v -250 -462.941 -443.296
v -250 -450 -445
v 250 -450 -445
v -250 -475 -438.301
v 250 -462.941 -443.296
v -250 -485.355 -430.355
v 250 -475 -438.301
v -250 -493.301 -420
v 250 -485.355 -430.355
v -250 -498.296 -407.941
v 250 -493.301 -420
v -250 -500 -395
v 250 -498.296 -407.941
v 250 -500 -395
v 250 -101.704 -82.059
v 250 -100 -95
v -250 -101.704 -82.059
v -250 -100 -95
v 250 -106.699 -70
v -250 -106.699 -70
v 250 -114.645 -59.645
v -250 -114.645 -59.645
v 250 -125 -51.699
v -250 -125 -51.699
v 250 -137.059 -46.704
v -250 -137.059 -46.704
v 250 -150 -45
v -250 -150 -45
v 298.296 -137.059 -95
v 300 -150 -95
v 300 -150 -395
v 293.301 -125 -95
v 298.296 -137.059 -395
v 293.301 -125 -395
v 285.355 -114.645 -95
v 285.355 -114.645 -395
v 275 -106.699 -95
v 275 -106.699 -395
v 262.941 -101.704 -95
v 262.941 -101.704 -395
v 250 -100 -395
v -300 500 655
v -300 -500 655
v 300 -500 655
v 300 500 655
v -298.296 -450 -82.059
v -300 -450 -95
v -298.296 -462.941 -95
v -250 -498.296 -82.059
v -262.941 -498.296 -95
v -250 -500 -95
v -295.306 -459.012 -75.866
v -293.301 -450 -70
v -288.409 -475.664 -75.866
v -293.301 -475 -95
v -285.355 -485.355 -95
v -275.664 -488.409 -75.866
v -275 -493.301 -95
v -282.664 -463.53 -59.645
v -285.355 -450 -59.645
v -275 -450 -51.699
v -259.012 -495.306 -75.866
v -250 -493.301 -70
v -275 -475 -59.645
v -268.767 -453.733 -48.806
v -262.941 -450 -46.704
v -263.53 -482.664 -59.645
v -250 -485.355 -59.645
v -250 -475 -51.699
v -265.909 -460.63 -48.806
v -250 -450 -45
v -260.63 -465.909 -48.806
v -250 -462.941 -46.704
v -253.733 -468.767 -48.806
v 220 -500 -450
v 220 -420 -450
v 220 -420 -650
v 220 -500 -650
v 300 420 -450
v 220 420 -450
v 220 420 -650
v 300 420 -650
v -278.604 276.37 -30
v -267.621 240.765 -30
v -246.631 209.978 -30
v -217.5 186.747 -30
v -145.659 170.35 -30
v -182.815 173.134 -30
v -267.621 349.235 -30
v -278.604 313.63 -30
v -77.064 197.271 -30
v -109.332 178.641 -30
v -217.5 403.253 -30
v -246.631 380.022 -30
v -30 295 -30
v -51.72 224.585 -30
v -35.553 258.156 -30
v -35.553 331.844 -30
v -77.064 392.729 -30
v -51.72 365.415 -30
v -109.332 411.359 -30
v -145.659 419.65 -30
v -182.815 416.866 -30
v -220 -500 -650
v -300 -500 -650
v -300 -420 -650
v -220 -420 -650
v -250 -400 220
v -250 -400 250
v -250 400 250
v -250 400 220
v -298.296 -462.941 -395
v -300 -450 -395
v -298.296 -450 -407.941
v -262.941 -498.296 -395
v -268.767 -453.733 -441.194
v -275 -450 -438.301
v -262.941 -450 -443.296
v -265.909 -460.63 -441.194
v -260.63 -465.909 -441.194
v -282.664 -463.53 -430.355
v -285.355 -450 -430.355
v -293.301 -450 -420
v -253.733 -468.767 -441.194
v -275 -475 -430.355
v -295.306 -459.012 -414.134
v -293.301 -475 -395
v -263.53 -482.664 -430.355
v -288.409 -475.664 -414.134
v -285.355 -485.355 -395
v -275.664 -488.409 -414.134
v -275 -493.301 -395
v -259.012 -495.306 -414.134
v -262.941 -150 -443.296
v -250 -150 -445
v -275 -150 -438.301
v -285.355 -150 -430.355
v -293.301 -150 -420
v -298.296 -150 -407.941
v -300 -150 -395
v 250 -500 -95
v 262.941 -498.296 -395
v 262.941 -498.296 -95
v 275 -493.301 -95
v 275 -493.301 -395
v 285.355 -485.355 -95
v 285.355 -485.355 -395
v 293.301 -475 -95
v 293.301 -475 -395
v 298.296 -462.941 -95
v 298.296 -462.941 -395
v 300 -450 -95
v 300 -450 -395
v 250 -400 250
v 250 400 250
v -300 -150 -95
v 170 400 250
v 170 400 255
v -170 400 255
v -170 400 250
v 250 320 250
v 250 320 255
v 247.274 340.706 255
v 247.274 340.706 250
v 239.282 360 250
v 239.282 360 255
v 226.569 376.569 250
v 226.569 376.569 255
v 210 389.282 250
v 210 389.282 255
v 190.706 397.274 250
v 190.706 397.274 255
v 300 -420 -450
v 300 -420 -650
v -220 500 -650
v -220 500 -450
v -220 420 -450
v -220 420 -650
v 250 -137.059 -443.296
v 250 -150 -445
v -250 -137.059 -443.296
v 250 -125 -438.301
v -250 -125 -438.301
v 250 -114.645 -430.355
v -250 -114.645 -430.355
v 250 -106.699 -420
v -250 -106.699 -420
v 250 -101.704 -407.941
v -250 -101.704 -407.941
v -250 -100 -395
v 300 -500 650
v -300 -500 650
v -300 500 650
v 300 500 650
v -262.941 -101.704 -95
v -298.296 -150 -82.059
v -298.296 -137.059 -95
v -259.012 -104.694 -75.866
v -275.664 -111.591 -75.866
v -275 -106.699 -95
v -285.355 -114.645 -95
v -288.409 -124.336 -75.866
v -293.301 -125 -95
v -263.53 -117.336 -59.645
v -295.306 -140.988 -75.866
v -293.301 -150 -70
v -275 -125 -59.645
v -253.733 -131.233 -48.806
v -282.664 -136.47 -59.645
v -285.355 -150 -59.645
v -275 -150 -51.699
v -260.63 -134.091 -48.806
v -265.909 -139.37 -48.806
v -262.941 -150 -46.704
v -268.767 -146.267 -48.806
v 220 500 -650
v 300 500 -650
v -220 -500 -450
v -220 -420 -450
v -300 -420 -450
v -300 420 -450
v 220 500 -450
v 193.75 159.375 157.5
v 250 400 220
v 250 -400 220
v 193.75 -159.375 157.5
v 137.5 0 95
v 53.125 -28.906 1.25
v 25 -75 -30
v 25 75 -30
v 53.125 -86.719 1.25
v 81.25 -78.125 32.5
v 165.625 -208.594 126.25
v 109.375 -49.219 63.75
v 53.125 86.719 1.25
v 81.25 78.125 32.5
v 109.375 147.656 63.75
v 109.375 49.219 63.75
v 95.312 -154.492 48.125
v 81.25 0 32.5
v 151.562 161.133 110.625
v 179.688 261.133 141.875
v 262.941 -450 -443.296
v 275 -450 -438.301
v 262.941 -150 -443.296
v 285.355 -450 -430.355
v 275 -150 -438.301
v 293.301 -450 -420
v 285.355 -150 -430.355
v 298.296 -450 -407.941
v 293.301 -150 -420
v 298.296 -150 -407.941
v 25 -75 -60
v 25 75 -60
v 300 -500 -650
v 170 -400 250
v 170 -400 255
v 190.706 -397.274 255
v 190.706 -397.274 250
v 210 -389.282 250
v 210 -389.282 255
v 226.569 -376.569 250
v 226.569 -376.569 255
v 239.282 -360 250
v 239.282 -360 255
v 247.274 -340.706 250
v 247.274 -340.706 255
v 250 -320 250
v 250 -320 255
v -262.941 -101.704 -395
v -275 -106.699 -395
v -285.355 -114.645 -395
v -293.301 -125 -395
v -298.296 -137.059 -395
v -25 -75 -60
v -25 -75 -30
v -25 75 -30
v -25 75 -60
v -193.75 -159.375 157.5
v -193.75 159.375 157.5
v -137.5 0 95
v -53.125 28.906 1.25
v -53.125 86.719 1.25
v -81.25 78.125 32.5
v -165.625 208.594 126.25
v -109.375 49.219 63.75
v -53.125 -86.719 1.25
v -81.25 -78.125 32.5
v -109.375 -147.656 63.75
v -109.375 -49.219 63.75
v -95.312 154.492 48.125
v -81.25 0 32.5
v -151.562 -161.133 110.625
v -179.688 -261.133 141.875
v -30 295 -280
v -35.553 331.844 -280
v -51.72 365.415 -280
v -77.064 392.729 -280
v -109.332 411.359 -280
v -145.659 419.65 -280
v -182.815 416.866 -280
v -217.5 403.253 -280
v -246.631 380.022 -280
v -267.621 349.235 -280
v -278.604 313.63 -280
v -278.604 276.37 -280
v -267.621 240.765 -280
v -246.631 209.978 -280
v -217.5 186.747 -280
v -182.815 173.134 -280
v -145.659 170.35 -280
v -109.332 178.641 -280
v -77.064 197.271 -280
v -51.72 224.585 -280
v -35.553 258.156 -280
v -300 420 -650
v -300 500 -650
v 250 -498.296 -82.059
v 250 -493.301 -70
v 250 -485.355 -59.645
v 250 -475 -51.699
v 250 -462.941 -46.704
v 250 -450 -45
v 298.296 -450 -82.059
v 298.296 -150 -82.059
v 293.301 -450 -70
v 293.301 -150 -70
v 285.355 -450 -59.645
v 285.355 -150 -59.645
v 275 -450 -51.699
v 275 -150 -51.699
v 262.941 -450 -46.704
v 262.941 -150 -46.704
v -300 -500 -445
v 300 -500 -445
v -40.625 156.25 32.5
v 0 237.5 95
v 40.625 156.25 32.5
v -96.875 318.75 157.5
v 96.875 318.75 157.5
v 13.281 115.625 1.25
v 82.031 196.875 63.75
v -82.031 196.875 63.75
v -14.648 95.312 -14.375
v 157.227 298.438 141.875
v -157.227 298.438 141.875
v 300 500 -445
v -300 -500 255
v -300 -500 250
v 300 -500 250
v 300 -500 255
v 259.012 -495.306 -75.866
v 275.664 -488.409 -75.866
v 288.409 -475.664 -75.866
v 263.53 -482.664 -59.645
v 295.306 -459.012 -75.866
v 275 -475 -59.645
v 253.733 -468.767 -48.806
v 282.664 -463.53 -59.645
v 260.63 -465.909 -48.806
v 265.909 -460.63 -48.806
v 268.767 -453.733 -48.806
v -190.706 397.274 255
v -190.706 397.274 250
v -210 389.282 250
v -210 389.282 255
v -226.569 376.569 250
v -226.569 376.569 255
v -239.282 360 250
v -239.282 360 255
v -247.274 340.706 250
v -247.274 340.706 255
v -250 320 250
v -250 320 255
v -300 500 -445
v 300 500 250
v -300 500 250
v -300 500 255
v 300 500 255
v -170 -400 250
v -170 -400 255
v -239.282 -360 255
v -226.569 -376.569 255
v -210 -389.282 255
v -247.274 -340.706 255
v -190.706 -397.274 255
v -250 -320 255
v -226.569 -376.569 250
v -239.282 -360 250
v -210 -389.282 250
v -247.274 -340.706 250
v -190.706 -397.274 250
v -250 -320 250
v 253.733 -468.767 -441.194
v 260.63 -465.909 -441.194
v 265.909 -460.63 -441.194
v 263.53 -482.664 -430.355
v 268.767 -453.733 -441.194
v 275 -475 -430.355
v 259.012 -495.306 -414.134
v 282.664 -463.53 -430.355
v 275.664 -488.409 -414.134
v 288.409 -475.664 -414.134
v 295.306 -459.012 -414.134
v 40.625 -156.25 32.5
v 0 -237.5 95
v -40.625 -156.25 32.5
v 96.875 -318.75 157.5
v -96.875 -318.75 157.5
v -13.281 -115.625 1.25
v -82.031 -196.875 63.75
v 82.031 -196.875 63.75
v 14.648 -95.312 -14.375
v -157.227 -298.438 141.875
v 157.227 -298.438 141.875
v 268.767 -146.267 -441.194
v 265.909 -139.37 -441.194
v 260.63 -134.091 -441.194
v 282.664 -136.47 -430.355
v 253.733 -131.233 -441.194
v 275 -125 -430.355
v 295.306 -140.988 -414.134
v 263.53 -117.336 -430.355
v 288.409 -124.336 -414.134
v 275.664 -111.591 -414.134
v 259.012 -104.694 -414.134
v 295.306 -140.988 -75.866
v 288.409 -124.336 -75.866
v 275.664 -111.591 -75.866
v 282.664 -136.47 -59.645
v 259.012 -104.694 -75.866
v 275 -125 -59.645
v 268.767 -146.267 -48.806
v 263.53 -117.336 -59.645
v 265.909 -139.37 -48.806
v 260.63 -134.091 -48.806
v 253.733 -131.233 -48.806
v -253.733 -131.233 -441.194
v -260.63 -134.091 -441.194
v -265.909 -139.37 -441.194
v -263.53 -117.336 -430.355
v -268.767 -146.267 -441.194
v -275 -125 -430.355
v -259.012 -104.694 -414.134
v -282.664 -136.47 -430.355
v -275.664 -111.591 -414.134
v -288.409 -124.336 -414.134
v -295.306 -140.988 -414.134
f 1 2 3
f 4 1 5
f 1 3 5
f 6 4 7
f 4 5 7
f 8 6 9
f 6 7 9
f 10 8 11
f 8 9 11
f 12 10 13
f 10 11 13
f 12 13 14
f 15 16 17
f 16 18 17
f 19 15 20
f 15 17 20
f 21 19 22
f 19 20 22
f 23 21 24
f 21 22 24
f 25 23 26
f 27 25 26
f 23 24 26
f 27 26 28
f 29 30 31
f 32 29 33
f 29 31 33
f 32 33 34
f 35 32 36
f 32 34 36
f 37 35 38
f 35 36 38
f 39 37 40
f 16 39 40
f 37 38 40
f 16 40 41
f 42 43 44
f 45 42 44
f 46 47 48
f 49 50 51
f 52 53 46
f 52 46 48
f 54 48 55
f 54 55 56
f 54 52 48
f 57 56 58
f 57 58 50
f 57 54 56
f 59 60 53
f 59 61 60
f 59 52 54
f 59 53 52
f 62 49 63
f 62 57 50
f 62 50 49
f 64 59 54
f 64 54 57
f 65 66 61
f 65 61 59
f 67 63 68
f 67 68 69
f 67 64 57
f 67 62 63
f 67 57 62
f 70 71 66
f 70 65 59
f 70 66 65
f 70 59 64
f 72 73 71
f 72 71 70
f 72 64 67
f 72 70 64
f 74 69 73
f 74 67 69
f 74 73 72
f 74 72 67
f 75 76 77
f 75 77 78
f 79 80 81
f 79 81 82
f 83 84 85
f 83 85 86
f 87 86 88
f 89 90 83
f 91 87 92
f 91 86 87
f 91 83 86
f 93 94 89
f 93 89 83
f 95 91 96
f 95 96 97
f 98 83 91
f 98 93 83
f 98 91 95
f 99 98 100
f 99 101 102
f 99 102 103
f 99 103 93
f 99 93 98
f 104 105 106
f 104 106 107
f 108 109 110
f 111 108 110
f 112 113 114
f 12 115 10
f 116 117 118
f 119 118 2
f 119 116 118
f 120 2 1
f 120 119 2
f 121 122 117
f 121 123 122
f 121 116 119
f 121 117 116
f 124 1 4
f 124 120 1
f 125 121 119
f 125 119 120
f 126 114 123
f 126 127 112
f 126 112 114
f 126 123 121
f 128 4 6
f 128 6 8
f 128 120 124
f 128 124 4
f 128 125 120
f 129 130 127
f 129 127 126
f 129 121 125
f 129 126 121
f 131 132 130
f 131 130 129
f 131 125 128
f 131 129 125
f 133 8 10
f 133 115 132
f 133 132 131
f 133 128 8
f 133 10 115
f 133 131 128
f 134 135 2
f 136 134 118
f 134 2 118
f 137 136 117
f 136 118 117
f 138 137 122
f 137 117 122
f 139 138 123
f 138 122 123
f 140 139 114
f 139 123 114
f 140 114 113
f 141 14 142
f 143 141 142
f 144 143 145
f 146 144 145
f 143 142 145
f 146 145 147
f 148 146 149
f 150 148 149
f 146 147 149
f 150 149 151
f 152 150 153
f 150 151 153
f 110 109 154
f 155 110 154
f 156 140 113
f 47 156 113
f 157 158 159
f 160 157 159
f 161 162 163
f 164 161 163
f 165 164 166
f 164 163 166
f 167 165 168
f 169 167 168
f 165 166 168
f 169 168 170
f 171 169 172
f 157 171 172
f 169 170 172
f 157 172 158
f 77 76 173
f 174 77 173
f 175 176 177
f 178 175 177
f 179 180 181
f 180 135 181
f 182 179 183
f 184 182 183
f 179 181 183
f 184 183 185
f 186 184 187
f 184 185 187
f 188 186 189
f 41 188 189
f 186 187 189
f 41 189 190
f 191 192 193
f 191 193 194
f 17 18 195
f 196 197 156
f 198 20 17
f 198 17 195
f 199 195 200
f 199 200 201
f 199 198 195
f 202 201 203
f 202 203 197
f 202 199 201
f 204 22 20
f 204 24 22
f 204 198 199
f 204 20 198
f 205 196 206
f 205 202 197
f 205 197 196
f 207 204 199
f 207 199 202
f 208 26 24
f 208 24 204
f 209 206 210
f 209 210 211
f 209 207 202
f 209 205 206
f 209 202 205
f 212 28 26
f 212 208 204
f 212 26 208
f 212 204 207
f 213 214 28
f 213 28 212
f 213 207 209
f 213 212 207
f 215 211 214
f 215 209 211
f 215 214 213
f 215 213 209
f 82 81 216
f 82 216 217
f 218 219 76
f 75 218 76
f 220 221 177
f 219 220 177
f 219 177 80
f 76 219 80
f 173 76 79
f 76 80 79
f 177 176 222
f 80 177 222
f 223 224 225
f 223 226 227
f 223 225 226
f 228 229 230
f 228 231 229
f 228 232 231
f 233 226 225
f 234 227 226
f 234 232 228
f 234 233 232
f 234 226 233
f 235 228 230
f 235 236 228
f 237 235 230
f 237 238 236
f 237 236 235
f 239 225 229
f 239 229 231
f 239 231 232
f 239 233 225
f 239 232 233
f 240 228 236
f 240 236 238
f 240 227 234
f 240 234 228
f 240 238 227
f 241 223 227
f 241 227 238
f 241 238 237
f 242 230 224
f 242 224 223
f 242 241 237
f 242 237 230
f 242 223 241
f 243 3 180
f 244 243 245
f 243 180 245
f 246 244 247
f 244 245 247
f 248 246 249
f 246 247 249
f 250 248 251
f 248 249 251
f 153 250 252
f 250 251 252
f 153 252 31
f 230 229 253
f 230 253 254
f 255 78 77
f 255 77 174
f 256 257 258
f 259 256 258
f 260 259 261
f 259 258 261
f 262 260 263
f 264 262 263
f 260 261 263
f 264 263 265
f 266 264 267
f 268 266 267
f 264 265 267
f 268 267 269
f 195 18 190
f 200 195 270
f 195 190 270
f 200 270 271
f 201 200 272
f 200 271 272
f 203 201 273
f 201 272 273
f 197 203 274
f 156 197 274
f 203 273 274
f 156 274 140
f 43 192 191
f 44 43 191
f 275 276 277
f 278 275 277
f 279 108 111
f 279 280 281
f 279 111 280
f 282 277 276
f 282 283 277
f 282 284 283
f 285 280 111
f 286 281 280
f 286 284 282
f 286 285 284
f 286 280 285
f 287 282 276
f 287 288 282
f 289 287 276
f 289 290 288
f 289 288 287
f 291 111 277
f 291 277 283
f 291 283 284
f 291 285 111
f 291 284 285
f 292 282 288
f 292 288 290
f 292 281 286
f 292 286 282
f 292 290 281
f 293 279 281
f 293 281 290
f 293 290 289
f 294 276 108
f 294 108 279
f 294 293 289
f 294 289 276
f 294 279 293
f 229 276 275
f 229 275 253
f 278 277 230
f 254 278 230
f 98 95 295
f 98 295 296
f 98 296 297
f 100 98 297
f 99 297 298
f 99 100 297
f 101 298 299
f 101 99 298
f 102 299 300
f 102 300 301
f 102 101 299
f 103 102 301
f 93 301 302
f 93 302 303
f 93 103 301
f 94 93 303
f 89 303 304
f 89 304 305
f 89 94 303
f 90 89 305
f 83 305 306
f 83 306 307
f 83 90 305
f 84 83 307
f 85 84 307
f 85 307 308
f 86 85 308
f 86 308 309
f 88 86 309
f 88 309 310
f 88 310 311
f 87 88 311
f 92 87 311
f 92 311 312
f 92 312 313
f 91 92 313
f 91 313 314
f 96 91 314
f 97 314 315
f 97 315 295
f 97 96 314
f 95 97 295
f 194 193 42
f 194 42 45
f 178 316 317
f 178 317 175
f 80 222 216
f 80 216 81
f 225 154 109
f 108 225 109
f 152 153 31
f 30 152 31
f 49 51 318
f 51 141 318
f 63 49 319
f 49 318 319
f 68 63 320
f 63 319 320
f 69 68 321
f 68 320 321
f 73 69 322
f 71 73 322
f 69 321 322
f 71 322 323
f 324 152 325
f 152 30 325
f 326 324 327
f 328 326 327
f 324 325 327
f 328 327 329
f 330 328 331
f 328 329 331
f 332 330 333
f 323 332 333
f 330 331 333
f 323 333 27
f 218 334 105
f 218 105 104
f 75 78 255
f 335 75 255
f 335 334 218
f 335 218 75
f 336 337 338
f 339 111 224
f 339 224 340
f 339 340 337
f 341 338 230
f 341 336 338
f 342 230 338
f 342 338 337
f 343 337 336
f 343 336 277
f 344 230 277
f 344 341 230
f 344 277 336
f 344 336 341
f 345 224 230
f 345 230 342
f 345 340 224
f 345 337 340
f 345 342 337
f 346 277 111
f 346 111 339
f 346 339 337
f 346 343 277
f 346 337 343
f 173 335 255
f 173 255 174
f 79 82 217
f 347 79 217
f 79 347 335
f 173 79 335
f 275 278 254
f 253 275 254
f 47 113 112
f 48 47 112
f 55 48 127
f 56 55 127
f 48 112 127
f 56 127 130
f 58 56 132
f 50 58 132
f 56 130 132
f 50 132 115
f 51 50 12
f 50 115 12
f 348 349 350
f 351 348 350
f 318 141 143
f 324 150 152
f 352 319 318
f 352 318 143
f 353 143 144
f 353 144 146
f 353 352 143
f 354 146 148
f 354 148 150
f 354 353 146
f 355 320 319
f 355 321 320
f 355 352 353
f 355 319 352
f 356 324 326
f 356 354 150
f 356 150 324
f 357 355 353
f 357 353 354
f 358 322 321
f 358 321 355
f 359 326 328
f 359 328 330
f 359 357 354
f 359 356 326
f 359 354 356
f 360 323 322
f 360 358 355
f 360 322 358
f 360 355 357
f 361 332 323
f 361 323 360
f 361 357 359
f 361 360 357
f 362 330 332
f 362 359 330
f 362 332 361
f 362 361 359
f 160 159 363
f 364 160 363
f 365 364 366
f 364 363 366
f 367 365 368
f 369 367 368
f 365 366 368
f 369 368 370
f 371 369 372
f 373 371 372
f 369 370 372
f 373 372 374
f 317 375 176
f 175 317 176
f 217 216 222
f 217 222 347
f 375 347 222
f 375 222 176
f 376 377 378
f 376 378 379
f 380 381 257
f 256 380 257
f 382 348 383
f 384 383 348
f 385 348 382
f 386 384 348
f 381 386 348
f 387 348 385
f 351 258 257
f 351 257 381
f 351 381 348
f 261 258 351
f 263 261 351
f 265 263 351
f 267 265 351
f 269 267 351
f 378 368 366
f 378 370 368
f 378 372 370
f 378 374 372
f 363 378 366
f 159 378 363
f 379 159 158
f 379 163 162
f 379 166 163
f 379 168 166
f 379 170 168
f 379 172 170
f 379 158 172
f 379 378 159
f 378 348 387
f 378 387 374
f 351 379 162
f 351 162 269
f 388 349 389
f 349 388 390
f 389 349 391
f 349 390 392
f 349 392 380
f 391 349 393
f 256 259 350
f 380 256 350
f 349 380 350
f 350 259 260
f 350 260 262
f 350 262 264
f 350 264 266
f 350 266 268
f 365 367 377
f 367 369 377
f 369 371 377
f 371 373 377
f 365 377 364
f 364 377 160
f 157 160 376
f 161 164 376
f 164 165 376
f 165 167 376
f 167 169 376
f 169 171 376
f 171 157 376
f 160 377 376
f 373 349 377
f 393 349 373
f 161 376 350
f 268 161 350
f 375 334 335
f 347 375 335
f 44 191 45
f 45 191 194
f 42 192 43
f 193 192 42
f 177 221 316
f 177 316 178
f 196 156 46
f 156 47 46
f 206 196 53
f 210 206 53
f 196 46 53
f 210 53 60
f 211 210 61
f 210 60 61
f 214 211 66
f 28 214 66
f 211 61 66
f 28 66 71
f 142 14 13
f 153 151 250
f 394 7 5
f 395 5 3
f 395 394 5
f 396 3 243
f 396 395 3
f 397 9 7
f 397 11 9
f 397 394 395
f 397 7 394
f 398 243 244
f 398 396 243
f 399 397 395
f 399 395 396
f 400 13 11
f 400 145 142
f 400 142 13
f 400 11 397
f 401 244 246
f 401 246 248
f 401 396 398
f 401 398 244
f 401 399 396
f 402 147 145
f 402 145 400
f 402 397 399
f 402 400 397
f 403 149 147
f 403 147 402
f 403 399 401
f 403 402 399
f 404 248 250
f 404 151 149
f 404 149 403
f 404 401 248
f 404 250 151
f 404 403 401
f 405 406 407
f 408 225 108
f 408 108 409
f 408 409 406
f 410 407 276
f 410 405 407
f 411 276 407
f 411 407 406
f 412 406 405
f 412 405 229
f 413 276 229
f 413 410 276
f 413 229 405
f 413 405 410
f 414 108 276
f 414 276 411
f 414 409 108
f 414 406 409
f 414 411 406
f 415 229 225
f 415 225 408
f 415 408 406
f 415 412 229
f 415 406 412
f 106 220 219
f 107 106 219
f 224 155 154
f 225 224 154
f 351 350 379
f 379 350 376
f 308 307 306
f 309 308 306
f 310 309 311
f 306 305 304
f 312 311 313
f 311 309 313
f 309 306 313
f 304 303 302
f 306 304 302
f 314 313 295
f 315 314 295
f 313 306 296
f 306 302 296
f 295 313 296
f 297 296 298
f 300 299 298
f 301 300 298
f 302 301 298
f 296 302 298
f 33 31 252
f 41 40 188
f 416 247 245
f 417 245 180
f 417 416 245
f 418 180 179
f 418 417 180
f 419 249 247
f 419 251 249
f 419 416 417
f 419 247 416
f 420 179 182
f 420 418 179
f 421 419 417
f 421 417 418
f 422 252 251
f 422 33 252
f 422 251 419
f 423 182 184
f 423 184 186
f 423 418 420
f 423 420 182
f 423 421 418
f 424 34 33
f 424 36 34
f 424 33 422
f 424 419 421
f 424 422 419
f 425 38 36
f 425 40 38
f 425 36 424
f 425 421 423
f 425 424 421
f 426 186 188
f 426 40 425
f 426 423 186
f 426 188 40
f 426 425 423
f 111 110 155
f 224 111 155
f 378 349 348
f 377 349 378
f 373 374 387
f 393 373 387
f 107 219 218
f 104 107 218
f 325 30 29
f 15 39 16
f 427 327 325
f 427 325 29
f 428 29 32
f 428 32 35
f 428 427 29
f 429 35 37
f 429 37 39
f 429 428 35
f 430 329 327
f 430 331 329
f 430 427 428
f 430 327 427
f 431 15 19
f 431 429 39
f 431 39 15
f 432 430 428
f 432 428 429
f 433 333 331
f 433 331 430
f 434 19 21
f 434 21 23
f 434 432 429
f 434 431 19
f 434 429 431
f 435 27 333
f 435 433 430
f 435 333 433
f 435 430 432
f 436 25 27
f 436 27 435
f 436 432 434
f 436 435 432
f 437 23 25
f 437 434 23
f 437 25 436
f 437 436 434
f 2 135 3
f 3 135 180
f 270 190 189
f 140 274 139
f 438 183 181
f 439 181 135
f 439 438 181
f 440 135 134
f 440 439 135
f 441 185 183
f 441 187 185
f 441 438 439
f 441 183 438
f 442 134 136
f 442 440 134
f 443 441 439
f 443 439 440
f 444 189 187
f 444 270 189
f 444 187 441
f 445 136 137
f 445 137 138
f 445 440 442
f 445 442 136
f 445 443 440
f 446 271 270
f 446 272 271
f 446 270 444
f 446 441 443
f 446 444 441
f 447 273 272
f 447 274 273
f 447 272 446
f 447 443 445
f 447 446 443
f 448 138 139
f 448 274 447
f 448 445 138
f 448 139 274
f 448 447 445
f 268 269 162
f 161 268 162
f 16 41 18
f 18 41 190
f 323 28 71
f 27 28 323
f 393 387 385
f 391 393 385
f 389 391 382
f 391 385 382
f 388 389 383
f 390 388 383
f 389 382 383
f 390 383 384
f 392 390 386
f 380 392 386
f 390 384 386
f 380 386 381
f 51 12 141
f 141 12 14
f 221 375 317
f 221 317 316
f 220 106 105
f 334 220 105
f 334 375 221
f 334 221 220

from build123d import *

# Parameters (mm, degrees)
F4_W       = 600
F4_H       = 1000
F5_DEPTH   = 5
F7_DEPTH   = 400
F8_R       = 50
F9_R       = 50
F10_W      = 600
F10_H      = 1000
F11_DEPTH  = 5
F13_DEPTH  = 5
F15_DEPTH  = 30
F16_R      = 125
F17_DEPTH  = 250
F18_W      = 50
F18_H      = 150
F19_DEPTH  = 30
F19_FACE_W = 50
F19_FACE_H = 150
F15_FACE_W = 500
F15_FACE_H = 800
F21_W      = 600
F21_H      = 1000
F22_DEPTH  = 5
F23_W      = 80
F23_H      = 80
F24_DEPTH  = 200


with BuildPart() as f5:
    # F4 (on offset) → F5 (new body)
    with BuildSketch(Plane.XY.offset(-450)):
        Rectangle(F4_W, F4_H)
    extrude(amount=F5_DEPTH)

    # F23 (on face) → F24 (join)
    with BuildSketch(Plane(origin=(0, 0, -450), x_dir=(1, 0, 0), z_dir=(0, 0, -1))):
        with Locations((-260, 460)):
            Rectangle(F23_W, F23_H)
        with Locations((260, 460)):
            Rectangle(F23_W, F23_H)
        with Locations((260, -460)):
            Rectangle(F23_W, F23_H)
        with Locations((-260, -460)):
            Rectangle(F23_W, F23_H)
    extrude(amount=F24_DEPTH)


with BuildPart() as f7:
    # F6 (on face) → F7 (new body)
    with BuildSketch(Plane.XY.offset(-445)):
        with BuildLine():
            ThreePointArc((-300, -450), (-285.3553390593, -485.3553390593), (-250, -500))
            Line((-250, -500), (250, -500))
            ThreePointArc((250, -500), (285.3553390593, -485.3553390593), (300, -450))
            Line((300, -450), (300, -150))
            ThreePointArc((300, -150), (285.3553390593, -114.6446609407), (250, -100))
            Line((250, -100), (-250, -100))
            ThreePointArc((-250, -100), (-285.3553390593, -114.6446609407), (-300, -150))
            Line((-300, -150), (-300, -450))
        make_face()
    extrude(amount=F7_DEPTH)

    # F8
    f8_edges = [f7.edges().sort_by_distance(p)[0] for p in [
        (300, -300, -45),
    ]]
    fillet(f8_edges, radius=F8_R)

    # F9
    f9_edges = [f7.edges().sort_by_distance(p)[0] for p in [
        (-285.355339, -114.644661, -445),
        (-300, -300, -445),
        (-285.355339, -485.355339, -445),
        (0, -500, -445),
        (285.355339, -485.355339, -445),
        (300, -300, -445),
        (285.355339, -114.644661, -445),
        (0, -100, -445),
    ]]
    fillet(f9_edges, radius=F9_R)


with BuildPart() as f11:
    # F10 (on offset) → F11 (new body)
    with BuildSketch(Plane.XY.offset(250)):
        Rectangle(F10_W, F10_H)
    extrude(amount=F11_DEPTH)

    # F12 (on face) → F13 (cut, symmetric)
    with BuildSketch(Plane.XY.offset(255)):
        with BuildLine():
            Line((170, 400), (-170, 400))
            ThreePointArc((-170, 400), (-226.5685424949, 376.5685424949), (-250, 320))
            Line((-250, 320), (-250, -320))
            ThreePointArc((-250, -320), (-226.5685424949, -376.5685424949), (-170, -400))
            Line((-170, -400), (170, -400))
            ThreePointArc((170, -400), (226.5685424949, -376.5685424949), (250, -320))
            Line((250, -320), (250, 320))
            ThreePointArc((250, 320), (226.5685424949, 376.5685424949), (170, 400))
        make_face()
    extrude(amount=F13_DEPTH, both=True, mode=Mode.SUBTRACT)


with BuildPart() as f15:
    # F14 (on face) → F15 (new body)
    with BuildSketch(Plane(origin=(0, 0, 250), x_dir=(1, 0, 0), z_dir=(0, 0, -1))):
        Polygon((170, 400), (-170, 400), (-250, 400), (-250, 320), (-250, -320), (-250, -400), (-170, -400), (170, -400), (250, -400), (250, -320), (250, 320), (250, 400), align=None)
    extrude(amount=F15_DEPTH)



with BuildPart() as f17:
    # F16 (on offset) → F17 (new body)
    with BuildSketch(Plane.XY.offset(-30)):
        with Locations((-155, 295)):
            Circle(F16_R)
    extrude(amount=-F17_DEPTH)


with BuildPart() as f19:
    # F18 (on offset) → F19 (new body)
    with BuildSketch(Plane.XY.offset(-30)):
        Rectangle(F18_W, F18_H)
    extrude(amount=-F19_DEPTH)


with BuildPart() as f15_1:
    add(f15.part)

    add(f19.part)  # F20 merges F19
    # F19_face (on face) → F20 section 0
    with BuildSketch(Plane.XY.offset(-30)):
        Rectangle(F19_FACE_W, F19_FACE_H)
    # F15_face (on face) → F20 section 1
    with BuildSketch(Plane(origin=(0, 0, 220), x_dir=(1, 0, 0), z_dir=(0, 0, -1))):
        Rectangle(F15_FACE_W, F15_FACE_H)
    loft()


with BuildPart() as f22:
    # F21 (on offset) → F22 (new body)
    with BuildSketch(Plane.XY.offset(650)):
        Rectangle(F21_W, F21_H)
    extrude(amount=F22_DEPTH)


solid = Compound([f5.part, f7.part, f11.part, f17.part, f15_1.part, f22.part])
